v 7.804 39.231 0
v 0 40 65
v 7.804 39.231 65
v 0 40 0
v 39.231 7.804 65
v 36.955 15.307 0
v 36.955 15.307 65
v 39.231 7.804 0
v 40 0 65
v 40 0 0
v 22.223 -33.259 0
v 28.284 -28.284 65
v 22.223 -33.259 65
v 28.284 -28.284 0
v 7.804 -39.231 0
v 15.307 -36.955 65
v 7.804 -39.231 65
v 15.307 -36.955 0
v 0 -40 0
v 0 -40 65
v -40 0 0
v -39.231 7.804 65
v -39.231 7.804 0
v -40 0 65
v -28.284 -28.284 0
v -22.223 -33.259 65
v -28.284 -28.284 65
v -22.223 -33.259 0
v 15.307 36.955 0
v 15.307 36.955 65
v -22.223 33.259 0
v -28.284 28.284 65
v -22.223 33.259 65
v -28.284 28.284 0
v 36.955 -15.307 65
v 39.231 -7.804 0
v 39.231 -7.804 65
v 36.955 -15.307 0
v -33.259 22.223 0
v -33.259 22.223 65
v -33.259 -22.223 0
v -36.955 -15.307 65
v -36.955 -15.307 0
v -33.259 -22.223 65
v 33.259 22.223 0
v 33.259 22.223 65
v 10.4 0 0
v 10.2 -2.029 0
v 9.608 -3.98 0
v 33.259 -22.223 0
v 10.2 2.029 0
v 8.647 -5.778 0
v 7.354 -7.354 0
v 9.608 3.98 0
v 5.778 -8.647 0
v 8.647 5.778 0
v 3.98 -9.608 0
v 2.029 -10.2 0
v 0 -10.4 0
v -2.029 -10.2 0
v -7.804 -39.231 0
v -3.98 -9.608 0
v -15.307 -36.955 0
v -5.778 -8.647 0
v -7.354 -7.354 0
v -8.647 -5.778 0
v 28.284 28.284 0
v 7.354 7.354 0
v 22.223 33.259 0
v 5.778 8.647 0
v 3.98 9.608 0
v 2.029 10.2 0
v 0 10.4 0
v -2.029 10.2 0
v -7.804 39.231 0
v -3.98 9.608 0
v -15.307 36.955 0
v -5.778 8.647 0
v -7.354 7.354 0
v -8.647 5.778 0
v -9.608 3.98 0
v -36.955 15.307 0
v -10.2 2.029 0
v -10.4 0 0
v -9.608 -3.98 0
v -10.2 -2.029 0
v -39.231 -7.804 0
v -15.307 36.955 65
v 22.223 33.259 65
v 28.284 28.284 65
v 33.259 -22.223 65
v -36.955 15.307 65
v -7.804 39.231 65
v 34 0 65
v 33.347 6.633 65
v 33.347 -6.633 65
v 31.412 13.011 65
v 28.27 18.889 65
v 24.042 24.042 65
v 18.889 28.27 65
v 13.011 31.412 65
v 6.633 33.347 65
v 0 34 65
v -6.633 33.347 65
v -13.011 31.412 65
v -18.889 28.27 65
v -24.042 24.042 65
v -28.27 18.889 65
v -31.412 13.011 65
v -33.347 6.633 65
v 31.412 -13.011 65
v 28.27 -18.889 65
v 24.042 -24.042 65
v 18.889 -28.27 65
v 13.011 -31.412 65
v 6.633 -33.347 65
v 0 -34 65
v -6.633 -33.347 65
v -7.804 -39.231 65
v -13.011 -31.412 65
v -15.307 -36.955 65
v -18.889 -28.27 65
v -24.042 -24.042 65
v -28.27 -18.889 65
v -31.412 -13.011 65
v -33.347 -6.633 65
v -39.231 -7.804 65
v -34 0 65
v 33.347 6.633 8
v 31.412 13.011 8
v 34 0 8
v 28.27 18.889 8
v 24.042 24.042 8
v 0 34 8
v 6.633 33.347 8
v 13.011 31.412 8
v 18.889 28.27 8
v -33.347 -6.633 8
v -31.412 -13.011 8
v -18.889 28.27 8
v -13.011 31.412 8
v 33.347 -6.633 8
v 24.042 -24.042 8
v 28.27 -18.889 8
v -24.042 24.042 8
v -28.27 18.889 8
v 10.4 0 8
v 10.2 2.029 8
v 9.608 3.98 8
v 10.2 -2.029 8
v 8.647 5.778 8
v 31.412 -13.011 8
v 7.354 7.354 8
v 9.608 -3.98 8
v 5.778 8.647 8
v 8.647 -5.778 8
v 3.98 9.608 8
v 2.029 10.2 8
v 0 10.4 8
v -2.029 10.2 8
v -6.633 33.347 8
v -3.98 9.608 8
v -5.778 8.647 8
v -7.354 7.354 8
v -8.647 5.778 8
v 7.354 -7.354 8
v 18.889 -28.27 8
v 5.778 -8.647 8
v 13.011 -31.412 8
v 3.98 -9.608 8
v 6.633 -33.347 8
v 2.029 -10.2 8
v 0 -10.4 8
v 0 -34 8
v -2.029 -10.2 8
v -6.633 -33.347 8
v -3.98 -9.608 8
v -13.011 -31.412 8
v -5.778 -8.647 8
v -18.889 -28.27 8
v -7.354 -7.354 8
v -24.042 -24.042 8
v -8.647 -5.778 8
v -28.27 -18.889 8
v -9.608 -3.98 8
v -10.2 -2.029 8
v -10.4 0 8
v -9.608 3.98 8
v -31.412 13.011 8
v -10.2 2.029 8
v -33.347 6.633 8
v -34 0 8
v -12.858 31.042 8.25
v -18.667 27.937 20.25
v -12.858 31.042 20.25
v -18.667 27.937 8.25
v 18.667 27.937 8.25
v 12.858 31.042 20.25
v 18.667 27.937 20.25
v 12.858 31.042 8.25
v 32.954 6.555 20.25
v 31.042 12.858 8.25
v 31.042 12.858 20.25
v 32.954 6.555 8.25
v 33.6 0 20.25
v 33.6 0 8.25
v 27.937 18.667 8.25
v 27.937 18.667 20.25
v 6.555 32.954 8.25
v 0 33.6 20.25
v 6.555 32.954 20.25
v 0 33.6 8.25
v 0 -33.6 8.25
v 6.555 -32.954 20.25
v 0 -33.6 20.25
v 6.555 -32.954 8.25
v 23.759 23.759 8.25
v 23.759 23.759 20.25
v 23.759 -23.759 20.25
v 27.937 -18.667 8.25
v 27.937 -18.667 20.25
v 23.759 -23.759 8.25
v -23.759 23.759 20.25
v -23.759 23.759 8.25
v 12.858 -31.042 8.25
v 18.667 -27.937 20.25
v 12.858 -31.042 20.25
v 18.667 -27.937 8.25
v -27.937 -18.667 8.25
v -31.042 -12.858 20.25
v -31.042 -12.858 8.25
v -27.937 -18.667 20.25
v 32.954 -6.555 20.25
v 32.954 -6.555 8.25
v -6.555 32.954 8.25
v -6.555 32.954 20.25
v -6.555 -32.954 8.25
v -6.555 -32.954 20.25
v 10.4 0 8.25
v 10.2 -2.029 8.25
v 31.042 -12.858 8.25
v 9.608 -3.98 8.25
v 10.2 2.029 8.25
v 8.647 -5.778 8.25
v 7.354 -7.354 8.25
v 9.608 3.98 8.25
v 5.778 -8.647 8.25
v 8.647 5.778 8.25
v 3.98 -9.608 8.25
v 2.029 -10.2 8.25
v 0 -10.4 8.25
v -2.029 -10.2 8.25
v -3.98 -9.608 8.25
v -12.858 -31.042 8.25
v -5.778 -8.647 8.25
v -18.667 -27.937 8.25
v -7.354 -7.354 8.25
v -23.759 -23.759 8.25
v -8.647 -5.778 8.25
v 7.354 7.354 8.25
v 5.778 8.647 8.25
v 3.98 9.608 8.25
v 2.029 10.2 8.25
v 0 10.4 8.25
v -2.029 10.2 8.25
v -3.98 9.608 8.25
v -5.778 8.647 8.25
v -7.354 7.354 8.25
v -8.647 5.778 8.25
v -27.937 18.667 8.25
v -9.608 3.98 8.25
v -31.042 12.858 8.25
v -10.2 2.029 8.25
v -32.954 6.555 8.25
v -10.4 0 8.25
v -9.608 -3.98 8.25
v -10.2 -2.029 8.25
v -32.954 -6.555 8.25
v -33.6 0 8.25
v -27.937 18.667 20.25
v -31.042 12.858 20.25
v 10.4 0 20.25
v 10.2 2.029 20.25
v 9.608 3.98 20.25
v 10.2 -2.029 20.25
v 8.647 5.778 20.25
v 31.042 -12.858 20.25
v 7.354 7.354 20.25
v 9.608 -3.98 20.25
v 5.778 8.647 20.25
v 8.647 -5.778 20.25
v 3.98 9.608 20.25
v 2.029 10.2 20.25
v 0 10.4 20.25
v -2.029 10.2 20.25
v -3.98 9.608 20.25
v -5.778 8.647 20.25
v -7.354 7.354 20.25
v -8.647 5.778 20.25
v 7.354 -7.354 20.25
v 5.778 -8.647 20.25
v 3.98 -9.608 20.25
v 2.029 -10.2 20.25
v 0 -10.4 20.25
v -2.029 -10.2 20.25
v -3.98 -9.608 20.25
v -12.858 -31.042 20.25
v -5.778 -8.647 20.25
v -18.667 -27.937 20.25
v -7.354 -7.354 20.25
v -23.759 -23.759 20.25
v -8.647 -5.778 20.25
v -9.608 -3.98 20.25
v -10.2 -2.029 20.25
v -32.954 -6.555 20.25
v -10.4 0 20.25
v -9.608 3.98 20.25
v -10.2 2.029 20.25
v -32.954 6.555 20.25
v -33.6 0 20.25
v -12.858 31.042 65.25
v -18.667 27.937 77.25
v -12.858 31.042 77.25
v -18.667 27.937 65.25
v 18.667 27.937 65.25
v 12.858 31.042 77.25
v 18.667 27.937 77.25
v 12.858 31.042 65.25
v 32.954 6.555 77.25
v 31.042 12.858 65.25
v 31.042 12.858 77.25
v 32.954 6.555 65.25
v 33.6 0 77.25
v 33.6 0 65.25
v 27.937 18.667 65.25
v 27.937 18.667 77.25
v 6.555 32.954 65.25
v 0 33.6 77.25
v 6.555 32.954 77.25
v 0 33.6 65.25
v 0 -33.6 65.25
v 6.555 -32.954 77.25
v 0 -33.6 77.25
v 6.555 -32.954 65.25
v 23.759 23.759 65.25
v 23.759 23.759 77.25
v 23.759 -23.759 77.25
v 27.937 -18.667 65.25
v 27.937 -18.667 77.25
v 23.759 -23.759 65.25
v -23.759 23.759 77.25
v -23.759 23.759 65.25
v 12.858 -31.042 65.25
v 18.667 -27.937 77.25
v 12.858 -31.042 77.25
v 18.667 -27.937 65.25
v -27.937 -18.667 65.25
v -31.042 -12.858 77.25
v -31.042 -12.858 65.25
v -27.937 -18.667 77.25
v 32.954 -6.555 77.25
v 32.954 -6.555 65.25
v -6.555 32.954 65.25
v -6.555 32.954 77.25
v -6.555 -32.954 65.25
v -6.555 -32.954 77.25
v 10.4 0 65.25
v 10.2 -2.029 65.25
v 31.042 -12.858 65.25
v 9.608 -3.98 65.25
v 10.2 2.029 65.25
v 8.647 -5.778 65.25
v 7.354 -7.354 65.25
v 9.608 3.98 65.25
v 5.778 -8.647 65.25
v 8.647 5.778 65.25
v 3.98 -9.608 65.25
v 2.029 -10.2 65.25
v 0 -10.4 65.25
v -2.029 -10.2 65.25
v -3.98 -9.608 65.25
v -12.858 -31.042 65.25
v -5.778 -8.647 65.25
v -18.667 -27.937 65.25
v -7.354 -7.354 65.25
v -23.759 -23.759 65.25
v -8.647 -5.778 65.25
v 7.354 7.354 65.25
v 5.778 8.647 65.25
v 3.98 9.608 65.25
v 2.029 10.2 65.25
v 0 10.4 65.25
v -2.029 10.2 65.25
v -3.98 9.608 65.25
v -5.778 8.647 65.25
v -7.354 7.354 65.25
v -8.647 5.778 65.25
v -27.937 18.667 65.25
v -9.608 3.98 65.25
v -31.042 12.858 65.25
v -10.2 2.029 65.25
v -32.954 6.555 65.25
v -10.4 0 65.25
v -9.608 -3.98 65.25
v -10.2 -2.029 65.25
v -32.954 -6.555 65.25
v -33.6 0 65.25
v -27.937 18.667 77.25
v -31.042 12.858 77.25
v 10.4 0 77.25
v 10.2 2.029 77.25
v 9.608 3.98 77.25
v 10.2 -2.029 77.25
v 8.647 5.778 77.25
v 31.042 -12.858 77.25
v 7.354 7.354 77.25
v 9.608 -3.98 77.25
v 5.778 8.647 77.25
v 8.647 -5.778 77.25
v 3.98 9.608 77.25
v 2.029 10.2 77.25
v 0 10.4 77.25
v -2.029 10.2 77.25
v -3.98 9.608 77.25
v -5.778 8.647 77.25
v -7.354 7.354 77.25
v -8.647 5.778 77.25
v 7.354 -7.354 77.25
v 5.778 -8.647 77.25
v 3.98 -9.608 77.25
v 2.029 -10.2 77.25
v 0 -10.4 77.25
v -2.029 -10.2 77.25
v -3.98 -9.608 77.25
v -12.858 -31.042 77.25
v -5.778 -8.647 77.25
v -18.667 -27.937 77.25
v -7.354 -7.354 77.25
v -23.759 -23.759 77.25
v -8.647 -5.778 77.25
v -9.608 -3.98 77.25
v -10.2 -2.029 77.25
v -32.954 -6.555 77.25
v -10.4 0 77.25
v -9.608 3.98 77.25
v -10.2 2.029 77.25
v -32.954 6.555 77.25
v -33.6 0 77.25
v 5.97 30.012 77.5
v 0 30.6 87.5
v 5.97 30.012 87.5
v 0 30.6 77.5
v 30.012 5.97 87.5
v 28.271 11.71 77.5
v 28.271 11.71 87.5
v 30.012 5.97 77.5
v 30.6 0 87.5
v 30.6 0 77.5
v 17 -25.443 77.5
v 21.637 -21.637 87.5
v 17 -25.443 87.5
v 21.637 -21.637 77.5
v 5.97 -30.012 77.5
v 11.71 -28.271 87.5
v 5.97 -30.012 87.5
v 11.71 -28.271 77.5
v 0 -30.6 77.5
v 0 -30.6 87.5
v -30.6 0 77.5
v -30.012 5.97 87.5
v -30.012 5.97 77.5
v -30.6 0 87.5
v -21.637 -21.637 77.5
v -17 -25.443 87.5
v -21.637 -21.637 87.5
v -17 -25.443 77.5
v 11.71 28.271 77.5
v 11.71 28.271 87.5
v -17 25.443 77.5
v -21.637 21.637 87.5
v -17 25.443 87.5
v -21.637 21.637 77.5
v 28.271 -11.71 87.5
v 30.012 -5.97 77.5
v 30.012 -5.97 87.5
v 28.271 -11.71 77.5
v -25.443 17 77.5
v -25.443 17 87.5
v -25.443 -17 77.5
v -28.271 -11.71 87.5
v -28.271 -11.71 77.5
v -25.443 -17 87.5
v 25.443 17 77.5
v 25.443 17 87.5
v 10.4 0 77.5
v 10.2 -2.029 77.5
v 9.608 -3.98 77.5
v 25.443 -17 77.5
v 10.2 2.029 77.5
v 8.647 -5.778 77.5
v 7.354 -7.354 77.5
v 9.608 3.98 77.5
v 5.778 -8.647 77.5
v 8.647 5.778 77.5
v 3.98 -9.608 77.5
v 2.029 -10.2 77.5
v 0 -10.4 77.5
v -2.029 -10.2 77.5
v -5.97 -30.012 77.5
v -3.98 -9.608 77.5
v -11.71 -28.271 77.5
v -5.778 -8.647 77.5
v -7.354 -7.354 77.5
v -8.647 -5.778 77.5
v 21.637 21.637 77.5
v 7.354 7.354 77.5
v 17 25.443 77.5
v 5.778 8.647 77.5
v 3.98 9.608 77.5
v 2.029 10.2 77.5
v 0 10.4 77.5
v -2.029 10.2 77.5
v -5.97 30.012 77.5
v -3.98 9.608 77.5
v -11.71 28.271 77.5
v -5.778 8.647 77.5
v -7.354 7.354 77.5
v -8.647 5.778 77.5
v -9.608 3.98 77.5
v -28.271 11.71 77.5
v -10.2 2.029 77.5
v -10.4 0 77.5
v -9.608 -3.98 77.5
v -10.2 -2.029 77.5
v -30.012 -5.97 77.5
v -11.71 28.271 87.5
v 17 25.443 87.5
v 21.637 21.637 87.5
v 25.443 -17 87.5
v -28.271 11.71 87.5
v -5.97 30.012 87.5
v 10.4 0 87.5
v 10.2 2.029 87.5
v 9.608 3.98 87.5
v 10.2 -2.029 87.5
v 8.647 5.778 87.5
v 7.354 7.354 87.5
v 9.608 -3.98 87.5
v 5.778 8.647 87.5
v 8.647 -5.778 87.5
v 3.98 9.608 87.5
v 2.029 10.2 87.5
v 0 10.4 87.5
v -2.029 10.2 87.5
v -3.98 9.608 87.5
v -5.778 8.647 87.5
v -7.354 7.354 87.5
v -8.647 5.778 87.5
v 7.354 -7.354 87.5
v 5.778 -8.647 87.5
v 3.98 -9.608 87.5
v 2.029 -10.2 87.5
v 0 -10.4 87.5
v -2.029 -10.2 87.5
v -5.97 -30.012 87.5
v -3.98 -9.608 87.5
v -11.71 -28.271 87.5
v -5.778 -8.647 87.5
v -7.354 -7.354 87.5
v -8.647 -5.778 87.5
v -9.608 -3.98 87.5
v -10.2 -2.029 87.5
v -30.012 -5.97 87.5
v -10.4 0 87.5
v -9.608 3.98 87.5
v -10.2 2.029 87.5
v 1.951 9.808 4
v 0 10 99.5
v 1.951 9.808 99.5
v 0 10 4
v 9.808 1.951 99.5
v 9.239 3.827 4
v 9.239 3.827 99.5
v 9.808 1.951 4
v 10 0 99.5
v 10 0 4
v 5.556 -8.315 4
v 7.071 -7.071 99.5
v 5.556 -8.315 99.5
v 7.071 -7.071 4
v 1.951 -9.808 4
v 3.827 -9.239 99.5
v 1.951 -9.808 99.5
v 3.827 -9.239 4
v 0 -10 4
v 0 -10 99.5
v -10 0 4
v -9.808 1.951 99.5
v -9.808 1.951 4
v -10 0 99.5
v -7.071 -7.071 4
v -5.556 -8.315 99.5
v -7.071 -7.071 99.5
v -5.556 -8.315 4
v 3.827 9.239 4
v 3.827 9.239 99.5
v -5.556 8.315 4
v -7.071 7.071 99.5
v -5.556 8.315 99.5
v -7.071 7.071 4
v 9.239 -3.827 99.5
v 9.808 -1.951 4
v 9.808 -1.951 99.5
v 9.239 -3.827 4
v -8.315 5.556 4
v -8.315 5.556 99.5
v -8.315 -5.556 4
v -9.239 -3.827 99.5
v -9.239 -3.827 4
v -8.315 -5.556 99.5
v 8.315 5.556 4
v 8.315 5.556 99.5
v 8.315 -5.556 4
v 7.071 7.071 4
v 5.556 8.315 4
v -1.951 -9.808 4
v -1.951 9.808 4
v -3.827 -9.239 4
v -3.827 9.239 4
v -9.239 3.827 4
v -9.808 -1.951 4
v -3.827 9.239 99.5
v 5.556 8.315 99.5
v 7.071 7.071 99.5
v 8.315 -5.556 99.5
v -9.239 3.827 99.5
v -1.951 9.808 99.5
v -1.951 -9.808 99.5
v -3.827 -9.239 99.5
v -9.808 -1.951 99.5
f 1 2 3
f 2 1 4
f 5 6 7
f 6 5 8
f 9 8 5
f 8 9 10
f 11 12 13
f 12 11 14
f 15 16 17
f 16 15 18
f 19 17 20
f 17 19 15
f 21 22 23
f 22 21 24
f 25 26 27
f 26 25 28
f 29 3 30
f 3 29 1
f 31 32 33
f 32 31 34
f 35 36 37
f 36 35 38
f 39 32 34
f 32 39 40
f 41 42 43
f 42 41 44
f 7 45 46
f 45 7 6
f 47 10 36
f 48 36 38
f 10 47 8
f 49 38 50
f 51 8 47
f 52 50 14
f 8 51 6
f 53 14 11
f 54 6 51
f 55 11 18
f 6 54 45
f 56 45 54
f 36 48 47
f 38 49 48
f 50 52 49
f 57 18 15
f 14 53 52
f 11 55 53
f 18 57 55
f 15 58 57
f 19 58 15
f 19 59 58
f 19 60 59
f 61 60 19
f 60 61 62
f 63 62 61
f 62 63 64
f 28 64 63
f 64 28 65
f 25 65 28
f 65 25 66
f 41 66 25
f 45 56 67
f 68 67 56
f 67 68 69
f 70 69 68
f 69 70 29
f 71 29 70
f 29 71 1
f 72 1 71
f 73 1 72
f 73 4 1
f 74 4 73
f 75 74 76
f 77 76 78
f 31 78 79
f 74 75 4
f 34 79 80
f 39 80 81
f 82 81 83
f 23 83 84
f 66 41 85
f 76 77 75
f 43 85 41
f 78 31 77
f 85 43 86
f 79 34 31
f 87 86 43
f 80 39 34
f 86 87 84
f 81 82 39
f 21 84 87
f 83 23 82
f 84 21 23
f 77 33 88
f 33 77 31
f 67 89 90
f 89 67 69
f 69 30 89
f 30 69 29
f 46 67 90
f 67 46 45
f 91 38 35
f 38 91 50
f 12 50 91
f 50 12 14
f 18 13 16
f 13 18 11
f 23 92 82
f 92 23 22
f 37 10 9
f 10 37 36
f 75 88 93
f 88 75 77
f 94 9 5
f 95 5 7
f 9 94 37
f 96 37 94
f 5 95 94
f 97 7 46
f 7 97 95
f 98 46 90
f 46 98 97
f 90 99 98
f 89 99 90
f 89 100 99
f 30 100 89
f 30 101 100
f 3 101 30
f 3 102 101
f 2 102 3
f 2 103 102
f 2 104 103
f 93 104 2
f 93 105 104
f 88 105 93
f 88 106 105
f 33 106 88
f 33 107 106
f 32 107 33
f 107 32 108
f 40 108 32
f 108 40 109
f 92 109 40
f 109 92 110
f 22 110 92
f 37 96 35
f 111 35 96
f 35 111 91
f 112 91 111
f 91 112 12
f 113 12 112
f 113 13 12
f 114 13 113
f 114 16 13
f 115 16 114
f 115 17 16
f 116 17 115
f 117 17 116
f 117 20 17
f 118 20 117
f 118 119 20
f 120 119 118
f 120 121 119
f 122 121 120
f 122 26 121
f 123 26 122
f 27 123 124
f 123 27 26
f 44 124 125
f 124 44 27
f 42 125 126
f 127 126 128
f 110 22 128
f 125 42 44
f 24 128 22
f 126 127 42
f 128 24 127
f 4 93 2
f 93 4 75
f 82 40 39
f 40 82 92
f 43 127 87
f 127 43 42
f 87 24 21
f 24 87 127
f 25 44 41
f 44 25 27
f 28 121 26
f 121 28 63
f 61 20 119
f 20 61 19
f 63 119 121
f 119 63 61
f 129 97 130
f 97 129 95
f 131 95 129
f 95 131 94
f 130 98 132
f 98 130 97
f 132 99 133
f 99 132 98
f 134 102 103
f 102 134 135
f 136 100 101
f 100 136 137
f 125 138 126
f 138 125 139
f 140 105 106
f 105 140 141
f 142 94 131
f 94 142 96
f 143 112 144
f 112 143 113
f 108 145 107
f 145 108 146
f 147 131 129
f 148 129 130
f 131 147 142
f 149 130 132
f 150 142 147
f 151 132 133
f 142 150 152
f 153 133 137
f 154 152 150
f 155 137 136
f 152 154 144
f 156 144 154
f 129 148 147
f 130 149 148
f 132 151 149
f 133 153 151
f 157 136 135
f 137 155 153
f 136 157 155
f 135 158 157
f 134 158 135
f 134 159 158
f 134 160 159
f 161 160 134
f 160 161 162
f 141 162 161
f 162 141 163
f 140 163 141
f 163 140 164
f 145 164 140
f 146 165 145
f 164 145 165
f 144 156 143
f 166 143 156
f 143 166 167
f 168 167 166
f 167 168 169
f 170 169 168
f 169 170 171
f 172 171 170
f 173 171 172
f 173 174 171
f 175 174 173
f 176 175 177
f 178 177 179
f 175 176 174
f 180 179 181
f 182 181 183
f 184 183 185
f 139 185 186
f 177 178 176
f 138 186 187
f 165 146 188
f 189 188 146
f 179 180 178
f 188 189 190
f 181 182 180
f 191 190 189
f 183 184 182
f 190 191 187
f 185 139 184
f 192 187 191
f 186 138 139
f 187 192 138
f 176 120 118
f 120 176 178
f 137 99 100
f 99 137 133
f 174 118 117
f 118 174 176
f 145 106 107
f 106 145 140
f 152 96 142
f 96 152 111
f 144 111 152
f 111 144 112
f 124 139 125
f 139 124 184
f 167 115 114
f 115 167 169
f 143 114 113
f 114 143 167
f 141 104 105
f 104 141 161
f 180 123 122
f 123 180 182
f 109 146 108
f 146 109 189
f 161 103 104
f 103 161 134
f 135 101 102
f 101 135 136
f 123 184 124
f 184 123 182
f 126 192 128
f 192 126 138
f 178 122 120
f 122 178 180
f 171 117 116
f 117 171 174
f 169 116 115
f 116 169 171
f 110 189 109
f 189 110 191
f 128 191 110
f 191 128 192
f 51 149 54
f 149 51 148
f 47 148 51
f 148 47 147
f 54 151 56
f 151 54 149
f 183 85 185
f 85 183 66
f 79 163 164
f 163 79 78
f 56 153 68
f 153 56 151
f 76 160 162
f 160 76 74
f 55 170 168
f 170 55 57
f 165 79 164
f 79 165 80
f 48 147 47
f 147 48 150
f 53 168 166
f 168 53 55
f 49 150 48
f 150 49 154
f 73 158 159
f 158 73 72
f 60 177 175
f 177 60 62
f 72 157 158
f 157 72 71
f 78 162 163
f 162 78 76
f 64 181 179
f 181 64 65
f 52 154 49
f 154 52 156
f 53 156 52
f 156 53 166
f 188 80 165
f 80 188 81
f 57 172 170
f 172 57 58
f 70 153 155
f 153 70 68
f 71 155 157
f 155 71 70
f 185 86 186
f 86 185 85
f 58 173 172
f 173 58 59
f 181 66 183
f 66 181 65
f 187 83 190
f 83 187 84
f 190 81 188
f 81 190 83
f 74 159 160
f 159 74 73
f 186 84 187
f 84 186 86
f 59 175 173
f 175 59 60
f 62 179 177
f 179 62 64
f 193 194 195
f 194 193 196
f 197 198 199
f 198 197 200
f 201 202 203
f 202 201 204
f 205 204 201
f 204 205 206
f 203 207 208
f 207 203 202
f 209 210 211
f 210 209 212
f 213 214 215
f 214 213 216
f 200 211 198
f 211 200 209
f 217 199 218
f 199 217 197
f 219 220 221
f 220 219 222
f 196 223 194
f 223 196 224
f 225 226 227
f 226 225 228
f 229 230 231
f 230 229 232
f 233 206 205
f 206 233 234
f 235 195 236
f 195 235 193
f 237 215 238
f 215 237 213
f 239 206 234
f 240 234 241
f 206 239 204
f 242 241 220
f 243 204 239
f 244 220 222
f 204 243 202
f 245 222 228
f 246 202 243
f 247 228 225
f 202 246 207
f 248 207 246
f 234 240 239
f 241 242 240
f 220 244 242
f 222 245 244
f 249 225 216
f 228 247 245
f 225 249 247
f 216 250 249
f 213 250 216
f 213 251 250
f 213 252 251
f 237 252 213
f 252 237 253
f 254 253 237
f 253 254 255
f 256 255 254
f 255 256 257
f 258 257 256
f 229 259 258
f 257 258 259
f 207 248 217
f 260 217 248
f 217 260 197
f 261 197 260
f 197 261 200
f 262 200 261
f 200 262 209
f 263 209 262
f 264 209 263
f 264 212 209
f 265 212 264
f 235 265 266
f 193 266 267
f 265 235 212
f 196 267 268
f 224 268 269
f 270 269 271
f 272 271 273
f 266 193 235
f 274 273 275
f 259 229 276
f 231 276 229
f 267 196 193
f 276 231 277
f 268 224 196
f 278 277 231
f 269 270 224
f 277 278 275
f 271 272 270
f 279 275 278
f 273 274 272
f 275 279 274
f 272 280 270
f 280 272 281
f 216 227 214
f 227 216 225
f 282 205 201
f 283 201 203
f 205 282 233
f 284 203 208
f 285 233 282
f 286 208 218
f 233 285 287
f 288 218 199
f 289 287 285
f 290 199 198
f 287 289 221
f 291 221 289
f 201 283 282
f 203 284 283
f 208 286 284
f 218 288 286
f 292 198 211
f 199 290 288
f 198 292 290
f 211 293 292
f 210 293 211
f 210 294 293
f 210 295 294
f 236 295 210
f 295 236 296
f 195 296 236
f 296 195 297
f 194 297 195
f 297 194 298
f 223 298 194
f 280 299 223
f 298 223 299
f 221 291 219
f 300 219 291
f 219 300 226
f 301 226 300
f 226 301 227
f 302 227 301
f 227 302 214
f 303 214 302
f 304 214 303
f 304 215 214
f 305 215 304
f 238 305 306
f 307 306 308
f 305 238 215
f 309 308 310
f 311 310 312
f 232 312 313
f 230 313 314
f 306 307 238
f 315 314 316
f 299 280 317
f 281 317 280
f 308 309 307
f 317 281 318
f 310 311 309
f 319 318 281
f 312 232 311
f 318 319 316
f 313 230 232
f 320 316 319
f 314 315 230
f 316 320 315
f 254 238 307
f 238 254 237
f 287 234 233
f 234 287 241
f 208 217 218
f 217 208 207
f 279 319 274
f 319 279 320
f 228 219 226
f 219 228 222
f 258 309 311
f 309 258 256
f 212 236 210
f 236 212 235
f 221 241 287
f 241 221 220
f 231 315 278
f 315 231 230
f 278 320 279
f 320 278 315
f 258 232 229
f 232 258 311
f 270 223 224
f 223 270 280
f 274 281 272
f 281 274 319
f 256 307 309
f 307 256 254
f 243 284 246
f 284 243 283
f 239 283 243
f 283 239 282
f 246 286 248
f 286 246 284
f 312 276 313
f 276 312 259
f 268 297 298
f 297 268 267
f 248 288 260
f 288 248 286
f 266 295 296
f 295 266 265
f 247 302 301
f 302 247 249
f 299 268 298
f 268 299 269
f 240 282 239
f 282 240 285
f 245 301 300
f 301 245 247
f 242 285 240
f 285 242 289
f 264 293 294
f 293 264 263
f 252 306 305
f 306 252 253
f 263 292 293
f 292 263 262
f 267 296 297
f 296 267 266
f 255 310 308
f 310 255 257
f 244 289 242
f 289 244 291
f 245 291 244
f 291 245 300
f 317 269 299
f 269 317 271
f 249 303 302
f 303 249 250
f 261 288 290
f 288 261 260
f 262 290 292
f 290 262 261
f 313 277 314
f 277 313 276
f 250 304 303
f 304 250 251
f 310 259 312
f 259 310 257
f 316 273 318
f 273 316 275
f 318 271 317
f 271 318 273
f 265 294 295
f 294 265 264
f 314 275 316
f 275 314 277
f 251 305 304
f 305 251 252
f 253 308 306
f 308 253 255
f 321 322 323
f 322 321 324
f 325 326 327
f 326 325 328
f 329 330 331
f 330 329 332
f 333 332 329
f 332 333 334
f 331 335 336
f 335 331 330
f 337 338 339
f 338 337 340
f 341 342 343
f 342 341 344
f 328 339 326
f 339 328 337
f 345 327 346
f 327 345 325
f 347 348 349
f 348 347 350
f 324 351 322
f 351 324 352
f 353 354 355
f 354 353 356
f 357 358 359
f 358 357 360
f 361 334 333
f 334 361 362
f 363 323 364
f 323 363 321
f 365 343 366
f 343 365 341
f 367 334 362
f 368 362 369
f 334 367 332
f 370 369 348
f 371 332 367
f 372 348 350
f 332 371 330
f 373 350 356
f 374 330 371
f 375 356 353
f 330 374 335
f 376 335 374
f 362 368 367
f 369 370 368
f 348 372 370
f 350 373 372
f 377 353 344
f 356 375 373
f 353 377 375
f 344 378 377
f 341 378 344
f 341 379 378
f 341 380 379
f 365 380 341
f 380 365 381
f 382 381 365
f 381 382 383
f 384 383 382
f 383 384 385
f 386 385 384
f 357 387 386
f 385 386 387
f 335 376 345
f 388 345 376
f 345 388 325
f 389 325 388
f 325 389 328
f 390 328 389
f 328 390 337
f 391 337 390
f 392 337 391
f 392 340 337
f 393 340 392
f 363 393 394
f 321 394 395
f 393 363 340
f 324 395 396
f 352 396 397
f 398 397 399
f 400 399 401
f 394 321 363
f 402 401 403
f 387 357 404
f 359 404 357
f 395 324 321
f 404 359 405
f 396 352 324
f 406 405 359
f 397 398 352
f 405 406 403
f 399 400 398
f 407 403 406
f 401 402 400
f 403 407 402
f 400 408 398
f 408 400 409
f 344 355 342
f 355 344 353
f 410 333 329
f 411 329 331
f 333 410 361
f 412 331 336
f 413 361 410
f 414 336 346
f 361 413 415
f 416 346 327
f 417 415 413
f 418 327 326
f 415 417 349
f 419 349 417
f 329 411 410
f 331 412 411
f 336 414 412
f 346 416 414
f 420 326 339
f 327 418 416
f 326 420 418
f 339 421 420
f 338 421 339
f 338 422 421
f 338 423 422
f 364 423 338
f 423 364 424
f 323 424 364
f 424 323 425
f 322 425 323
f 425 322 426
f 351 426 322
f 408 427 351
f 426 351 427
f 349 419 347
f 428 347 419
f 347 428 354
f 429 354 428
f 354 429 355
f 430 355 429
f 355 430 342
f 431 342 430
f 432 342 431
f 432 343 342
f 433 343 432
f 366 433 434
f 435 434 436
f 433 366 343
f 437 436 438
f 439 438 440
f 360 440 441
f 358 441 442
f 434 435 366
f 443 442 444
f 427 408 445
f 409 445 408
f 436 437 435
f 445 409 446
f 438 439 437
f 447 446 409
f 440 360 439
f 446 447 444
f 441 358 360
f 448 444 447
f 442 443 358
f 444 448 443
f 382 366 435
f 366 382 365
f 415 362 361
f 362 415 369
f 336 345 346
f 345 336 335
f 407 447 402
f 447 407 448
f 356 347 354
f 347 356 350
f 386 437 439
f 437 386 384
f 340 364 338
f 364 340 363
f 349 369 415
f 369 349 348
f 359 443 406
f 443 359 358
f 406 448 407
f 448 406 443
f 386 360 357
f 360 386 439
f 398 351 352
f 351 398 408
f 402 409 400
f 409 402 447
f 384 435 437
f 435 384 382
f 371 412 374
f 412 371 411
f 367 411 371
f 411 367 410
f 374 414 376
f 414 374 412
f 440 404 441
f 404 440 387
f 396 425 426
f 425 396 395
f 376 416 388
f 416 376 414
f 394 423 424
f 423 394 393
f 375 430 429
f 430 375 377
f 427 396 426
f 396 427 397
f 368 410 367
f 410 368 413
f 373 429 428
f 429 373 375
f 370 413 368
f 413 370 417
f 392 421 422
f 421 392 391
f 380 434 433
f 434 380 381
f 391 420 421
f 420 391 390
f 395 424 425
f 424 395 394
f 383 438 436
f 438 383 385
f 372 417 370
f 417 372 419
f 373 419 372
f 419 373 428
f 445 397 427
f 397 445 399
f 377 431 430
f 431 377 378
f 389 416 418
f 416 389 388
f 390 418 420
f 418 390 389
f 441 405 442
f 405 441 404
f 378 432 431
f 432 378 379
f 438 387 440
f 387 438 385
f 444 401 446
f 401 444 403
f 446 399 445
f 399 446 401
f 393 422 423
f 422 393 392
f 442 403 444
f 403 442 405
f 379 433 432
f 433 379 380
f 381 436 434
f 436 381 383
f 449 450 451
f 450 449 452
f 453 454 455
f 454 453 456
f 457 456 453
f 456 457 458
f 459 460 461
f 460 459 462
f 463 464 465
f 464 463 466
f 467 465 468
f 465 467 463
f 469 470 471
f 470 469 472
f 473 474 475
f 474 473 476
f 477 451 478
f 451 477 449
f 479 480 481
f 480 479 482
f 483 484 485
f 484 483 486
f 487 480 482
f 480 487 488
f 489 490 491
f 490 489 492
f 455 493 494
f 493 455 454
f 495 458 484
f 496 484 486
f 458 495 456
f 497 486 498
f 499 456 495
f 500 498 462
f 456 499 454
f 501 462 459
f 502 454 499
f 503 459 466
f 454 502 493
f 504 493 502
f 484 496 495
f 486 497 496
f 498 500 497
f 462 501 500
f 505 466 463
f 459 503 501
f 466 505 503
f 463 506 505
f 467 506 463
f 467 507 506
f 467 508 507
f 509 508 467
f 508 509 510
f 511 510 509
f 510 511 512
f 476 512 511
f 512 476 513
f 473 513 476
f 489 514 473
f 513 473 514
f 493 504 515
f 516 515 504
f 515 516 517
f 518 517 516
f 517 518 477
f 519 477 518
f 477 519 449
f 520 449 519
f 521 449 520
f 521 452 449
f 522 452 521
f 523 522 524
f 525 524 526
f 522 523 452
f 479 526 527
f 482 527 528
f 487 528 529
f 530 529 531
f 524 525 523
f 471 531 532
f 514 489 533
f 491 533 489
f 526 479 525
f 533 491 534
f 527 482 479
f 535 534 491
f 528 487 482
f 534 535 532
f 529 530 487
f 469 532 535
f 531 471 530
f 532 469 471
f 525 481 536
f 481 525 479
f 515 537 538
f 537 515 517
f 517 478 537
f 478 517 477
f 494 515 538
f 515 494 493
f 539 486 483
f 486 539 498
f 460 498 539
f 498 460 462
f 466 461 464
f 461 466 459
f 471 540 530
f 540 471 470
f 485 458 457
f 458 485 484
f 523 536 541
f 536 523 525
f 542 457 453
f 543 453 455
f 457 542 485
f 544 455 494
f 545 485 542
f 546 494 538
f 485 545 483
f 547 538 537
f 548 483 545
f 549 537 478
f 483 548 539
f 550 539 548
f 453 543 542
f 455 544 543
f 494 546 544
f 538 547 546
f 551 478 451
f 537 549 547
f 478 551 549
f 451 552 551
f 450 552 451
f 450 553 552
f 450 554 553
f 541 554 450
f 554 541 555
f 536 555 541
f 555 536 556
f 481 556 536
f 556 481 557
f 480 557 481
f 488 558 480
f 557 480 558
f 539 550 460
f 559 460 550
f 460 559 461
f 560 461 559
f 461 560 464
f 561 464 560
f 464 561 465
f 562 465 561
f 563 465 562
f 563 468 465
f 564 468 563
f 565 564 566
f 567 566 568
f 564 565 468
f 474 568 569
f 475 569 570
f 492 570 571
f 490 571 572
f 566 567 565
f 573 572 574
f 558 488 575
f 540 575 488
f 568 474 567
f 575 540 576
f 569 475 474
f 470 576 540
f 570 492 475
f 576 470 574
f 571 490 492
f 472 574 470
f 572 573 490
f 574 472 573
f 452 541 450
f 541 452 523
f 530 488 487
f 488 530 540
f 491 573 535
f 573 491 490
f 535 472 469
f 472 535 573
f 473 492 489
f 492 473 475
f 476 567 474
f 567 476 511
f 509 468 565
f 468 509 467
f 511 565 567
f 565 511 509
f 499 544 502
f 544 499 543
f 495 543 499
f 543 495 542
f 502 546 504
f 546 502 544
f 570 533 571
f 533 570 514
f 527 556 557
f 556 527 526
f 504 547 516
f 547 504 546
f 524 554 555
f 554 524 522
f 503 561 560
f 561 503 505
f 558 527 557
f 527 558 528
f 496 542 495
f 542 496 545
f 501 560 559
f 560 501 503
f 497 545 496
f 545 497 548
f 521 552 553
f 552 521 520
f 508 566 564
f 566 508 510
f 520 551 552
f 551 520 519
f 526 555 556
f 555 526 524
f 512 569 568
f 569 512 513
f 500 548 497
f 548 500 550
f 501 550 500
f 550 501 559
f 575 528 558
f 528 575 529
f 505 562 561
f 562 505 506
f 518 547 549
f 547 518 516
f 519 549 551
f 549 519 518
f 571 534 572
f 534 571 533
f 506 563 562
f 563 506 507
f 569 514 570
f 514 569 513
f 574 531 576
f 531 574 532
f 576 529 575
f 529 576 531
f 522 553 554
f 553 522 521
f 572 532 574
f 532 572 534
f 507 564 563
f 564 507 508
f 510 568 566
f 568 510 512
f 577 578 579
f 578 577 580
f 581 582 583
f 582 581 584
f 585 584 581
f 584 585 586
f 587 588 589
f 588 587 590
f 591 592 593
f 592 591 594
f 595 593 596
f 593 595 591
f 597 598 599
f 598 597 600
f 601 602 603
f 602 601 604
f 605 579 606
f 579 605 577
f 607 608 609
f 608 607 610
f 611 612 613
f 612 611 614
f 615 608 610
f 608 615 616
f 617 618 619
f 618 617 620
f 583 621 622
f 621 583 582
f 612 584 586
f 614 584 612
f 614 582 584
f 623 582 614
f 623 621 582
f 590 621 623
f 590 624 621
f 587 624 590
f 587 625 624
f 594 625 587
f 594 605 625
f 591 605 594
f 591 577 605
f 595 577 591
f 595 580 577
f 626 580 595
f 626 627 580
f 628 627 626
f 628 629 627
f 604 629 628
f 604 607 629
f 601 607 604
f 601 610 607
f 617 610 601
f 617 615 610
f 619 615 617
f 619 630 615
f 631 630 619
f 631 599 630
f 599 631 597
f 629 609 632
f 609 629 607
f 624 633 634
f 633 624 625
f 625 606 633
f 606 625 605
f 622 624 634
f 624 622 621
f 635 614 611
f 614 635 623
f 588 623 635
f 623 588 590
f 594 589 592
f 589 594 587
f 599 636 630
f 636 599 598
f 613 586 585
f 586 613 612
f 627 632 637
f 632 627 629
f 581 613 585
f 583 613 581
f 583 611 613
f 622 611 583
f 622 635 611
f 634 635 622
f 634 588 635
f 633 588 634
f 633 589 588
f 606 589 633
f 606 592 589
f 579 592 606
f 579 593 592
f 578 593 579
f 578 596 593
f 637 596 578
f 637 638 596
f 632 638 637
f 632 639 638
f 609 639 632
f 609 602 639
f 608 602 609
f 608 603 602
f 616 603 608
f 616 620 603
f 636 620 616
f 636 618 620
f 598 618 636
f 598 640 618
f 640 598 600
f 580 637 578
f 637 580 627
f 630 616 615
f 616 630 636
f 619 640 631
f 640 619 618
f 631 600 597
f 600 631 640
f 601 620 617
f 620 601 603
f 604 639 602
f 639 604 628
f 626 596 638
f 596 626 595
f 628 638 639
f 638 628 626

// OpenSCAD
$fn = 32;

// ------------------------------------------------------------------------
// Bearing housing: housing d80, two bearings and a shaft
// Every part is its own module, assembly() places them once.
// ------------------------------------------------------------------------

// --- part 1 ---
module housing() {
  difference() {
    cylinder(h = 65, d = 80);
    translate([0, 0, 8]) cylinder(h = 58, d = 68);
    translate([0, 0, -1]) cylinder(h = 10, d = 20.8);
  }
}

// --- part 2 ---
module bearing_lower() {
  difference() {
      translate([0, 0, 0]) cylinder(h = 12, d = 67.2);
      translate([0, 0, -1]) cylinder(h = 14, d = 20.8);
    }
}

// --- part 3 ---
module bearing_upper() {
  difference() {
      translate([0, 0, 0]) cylinder(h = 12, d = 67.2);
      translate([0, 0, -1]) cylinder(h = 14, d = 20.8);
    }
}

// --- part 4 ---
module spacer() {
  difference() {
      translate([0, 0, 0]) cylinder(h = 10, d = 61.2);
      translate([0, 0, -1]) cylinder(h = 12, d = 20.8);
    }
}

// --- part 5 ---
module shaft() {
  translate([0, 0, -47.75]) cylinder(h = 95.5, d = 20);
}

// --- assembly ---
module assembly() {
  translate([0, 0, 0]) rotate([0, 0, 0]) housing();
  translate([0, 0, 8.25]) rotate([0, 0, 0]) bearing_lower();
  translate([0, 0, 65.25]) rotate([0, 0, 0]) bearing_upper();
  translate([0, 0, 77.5]) rotate([0, 0, 0]) spacer();
  translate([0, 0, 51.75]) rotate([0, 0, 0]) shaft();
}

assembly();
